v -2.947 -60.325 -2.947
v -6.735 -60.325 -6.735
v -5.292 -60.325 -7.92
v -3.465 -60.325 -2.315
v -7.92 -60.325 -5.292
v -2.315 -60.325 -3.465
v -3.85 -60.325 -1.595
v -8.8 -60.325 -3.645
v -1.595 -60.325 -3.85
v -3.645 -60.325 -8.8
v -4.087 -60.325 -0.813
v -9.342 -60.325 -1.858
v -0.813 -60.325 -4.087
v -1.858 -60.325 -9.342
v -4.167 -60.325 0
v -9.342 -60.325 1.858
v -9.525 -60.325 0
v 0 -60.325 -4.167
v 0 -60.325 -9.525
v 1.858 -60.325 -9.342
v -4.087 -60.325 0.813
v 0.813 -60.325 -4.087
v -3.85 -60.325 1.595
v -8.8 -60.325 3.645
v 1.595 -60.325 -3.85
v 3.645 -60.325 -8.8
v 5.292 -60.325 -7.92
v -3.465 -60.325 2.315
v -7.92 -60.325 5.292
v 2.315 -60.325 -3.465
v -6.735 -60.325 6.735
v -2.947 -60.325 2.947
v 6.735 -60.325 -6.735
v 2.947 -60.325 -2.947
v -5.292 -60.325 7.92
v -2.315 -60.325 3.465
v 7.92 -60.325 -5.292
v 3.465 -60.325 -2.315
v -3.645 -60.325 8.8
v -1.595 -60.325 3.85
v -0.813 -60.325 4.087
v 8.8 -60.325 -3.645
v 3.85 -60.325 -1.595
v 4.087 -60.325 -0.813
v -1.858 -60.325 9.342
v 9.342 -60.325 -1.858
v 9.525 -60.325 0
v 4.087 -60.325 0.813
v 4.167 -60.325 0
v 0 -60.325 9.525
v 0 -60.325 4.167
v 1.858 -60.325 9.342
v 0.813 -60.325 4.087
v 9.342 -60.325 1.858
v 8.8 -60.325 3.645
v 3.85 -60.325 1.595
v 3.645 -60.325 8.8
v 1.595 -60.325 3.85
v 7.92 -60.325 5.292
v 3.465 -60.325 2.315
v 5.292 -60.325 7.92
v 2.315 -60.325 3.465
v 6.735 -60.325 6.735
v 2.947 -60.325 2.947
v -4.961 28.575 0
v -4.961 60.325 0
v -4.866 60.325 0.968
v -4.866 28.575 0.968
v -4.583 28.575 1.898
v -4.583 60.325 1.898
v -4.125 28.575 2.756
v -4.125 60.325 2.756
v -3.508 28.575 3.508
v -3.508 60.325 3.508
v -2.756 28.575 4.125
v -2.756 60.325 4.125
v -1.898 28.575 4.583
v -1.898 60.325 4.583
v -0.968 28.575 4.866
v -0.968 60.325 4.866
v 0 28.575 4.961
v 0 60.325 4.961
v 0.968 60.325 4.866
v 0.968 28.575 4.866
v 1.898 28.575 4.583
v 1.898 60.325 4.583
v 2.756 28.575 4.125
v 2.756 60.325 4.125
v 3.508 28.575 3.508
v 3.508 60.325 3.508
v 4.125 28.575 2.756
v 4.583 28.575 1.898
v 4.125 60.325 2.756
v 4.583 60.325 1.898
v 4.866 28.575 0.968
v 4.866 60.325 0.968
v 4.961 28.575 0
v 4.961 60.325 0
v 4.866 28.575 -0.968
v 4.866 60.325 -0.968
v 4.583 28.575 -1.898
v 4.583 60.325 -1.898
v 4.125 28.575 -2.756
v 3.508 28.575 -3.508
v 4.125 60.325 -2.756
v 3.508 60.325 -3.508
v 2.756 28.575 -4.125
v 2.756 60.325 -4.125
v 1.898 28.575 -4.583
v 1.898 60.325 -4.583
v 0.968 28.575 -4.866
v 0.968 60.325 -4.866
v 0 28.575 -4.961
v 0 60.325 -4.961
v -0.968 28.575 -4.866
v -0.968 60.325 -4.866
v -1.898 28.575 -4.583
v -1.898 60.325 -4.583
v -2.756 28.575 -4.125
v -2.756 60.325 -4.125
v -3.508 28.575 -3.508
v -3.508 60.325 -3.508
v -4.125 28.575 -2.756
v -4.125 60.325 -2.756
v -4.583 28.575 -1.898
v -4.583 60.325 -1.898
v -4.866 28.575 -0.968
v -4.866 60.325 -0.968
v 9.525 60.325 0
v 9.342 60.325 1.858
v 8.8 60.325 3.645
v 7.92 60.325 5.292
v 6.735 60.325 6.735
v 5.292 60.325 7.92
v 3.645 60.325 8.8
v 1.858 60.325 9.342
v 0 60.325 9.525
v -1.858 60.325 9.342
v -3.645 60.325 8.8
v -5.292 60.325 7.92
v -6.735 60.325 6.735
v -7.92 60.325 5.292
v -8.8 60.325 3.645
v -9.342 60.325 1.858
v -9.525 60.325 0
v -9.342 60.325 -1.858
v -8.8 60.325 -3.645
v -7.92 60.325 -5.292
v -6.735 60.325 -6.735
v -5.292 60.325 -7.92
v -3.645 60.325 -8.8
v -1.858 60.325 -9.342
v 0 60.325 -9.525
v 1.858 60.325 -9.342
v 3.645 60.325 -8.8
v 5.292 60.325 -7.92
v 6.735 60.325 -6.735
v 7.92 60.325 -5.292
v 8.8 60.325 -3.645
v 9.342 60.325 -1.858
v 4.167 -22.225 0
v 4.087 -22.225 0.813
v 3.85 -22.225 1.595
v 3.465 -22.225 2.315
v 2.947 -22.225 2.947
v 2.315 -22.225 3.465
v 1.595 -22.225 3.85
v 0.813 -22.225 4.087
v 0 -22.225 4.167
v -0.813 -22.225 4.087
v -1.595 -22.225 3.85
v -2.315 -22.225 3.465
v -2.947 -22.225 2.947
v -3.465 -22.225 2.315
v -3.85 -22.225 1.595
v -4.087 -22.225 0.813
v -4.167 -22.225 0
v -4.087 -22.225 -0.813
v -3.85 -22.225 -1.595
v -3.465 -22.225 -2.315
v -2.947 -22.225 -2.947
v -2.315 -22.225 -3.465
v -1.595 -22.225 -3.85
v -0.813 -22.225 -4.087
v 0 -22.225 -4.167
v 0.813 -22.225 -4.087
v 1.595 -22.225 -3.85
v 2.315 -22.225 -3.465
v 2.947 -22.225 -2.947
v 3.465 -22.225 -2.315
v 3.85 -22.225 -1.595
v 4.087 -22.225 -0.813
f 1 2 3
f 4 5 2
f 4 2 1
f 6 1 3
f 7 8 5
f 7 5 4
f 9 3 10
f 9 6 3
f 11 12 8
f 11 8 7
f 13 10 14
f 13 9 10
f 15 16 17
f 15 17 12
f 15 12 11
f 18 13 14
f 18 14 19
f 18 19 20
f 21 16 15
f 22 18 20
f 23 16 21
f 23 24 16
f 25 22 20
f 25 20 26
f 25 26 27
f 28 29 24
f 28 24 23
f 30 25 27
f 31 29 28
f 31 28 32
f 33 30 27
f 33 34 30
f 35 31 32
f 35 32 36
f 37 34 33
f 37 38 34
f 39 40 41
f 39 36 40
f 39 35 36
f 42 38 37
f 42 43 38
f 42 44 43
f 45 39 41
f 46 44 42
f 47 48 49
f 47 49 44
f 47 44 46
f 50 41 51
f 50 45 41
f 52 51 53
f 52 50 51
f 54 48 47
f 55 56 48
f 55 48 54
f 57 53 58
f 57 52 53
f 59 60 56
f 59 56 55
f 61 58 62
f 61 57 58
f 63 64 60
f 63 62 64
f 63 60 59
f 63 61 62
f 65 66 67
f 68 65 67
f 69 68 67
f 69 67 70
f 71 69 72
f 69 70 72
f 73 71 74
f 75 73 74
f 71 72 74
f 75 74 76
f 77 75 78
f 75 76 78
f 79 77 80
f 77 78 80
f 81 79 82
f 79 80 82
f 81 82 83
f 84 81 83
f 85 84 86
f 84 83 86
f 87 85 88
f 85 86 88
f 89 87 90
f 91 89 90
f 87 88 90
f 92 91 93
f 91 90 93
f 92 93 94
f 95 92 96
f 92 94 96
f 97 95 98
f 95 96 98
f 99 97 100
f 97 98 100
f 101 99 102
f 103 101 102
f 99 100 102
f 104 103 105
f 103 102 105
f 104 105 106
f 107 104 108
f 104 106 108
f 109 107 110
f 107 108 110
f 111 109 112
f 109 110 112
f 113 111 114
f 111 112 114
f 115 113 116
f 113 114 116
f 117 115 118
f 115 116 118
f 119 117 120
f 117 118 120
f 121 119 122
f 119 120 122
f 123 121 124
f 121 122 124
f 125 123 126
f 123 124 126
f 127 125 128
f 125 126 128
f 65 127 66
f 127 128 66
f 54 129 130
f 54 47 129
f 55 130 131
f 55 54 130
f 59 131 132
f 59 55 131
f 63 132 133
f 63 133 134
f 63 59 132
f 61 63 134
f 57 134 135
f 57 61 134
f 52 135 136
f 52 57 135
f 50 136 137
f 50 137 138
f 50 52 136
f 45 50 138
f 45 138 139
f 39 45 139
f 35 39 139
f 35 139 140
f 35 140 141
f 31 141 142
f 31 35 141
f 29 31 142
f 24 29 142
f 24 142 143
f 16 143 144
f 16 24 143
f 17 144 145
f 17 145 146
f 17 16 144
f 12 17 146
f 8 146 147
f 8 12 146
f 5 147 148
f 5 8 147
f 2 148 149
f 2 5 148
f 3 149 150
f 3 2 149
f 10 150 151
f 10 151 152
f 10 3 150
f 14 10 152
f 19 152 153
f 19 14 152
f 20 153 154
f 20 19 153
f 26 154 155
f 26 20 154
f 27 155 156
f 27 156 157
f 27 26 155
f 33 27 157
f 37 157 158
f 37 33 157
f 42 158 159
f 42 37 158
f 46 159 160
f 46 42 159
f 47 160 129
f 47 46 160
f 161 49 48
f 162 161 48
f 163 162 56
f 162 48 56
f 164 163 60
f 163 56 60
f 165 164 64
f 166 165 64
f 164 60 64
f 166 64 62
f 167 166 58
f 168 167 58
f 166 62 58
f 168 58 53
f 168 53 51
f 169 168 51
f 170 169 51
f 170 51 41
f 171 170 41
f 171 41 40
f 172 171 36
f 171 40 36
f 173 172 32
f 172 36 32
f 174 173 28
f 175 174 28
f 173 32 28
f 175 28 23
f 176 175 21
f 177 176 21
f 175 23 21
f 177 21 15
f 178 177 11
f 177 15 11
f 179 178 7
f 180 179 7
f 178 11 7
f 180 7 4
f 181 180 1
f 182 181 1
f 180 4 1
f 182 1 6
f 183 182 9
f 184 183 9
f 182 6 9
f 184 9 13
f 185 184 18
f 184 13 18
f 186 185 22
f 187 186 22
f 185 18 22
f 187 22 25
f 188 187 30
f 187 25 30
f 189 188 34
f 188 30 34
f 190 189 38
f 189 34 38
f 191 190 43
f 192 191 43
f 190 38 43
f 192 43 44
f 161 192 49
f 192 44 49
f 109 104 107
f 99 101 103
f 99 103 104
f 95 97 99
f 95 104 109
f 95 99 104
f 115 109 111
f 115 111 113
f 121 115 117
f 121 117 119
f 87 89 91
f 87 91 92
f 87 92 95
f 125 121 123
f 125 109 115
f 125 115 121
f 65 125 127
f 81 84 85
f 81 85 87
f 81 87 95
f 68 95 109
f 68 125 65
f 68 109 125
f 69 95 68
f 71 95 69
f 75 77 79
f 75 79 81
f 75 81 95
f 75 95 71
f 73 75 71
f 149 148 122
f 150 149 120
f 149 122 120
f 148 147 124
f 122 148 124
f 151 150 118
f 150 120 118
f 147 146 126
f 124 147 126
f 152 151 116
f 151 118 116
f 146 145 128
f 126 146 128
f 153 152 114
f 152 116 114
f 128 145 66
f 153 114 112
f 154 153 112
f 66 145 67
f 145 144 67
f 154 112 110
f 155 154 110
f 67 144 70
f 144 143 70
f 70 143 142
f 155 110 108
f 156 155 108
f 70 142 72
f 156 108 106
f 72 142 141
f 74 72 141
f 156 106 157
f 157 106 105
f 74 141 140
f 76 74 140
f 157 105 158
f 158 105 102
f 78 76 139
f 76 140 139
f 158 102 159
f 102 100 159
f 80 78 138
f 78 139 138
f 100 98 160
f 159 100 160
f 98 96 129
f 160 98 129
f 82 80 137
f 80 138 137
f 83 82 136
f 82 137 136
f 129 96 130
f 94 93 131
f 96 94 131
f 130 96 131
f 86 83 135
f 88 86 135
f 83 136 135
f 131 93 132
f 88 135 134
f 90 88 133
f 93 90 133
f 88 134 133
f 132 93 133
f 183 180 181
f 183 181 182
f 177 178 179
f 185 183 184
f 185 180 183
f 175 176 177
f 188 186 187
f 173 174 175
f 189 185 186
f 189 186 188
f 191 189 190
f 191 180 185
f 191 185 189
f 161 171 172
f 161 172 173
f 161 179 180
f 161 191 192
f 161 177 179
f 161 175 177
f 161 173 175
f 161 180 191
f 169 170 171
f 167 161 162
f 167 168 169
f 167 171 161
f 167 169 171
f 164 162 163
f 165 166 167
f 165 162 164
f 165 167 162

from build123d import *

# Parameters (mm, degrees)
F0_R     = 9.525
F1_DEPTH = 60.325
F2_R     = 4.167188
F3_DEPTH = 38.1
F4_R     = 4.960938
F5_DEPTH = 31.75


with BuildPart() as f1:
    # F0 (on Front) → F1 (new body, symmetric)
    with BuildSketch(Plane.XZ):
        Circle(F0_R)
    extrude(amount=F1_DEPTH, both=True)

    # F2 (on face) → F3 (cut)
    with BuildSketch(Plane.XZ.offset(60.325)):
        Circle(F2_R)
    extrude(amount=-F3_DEPTH, mode=Mode.SUBTRACT)

    # F4 (on face) → F5 (cut)
    with BuildSketch(Plane(origin=(0, 60.325, 0), x_dir=(-1, 0, 0), z_dir=(0, 1, 0))):
        Circle(F4_R)
    extrude(amount=-F5_DEPTH, mode=Mode.SUBTRACT)


solid = f1.part
